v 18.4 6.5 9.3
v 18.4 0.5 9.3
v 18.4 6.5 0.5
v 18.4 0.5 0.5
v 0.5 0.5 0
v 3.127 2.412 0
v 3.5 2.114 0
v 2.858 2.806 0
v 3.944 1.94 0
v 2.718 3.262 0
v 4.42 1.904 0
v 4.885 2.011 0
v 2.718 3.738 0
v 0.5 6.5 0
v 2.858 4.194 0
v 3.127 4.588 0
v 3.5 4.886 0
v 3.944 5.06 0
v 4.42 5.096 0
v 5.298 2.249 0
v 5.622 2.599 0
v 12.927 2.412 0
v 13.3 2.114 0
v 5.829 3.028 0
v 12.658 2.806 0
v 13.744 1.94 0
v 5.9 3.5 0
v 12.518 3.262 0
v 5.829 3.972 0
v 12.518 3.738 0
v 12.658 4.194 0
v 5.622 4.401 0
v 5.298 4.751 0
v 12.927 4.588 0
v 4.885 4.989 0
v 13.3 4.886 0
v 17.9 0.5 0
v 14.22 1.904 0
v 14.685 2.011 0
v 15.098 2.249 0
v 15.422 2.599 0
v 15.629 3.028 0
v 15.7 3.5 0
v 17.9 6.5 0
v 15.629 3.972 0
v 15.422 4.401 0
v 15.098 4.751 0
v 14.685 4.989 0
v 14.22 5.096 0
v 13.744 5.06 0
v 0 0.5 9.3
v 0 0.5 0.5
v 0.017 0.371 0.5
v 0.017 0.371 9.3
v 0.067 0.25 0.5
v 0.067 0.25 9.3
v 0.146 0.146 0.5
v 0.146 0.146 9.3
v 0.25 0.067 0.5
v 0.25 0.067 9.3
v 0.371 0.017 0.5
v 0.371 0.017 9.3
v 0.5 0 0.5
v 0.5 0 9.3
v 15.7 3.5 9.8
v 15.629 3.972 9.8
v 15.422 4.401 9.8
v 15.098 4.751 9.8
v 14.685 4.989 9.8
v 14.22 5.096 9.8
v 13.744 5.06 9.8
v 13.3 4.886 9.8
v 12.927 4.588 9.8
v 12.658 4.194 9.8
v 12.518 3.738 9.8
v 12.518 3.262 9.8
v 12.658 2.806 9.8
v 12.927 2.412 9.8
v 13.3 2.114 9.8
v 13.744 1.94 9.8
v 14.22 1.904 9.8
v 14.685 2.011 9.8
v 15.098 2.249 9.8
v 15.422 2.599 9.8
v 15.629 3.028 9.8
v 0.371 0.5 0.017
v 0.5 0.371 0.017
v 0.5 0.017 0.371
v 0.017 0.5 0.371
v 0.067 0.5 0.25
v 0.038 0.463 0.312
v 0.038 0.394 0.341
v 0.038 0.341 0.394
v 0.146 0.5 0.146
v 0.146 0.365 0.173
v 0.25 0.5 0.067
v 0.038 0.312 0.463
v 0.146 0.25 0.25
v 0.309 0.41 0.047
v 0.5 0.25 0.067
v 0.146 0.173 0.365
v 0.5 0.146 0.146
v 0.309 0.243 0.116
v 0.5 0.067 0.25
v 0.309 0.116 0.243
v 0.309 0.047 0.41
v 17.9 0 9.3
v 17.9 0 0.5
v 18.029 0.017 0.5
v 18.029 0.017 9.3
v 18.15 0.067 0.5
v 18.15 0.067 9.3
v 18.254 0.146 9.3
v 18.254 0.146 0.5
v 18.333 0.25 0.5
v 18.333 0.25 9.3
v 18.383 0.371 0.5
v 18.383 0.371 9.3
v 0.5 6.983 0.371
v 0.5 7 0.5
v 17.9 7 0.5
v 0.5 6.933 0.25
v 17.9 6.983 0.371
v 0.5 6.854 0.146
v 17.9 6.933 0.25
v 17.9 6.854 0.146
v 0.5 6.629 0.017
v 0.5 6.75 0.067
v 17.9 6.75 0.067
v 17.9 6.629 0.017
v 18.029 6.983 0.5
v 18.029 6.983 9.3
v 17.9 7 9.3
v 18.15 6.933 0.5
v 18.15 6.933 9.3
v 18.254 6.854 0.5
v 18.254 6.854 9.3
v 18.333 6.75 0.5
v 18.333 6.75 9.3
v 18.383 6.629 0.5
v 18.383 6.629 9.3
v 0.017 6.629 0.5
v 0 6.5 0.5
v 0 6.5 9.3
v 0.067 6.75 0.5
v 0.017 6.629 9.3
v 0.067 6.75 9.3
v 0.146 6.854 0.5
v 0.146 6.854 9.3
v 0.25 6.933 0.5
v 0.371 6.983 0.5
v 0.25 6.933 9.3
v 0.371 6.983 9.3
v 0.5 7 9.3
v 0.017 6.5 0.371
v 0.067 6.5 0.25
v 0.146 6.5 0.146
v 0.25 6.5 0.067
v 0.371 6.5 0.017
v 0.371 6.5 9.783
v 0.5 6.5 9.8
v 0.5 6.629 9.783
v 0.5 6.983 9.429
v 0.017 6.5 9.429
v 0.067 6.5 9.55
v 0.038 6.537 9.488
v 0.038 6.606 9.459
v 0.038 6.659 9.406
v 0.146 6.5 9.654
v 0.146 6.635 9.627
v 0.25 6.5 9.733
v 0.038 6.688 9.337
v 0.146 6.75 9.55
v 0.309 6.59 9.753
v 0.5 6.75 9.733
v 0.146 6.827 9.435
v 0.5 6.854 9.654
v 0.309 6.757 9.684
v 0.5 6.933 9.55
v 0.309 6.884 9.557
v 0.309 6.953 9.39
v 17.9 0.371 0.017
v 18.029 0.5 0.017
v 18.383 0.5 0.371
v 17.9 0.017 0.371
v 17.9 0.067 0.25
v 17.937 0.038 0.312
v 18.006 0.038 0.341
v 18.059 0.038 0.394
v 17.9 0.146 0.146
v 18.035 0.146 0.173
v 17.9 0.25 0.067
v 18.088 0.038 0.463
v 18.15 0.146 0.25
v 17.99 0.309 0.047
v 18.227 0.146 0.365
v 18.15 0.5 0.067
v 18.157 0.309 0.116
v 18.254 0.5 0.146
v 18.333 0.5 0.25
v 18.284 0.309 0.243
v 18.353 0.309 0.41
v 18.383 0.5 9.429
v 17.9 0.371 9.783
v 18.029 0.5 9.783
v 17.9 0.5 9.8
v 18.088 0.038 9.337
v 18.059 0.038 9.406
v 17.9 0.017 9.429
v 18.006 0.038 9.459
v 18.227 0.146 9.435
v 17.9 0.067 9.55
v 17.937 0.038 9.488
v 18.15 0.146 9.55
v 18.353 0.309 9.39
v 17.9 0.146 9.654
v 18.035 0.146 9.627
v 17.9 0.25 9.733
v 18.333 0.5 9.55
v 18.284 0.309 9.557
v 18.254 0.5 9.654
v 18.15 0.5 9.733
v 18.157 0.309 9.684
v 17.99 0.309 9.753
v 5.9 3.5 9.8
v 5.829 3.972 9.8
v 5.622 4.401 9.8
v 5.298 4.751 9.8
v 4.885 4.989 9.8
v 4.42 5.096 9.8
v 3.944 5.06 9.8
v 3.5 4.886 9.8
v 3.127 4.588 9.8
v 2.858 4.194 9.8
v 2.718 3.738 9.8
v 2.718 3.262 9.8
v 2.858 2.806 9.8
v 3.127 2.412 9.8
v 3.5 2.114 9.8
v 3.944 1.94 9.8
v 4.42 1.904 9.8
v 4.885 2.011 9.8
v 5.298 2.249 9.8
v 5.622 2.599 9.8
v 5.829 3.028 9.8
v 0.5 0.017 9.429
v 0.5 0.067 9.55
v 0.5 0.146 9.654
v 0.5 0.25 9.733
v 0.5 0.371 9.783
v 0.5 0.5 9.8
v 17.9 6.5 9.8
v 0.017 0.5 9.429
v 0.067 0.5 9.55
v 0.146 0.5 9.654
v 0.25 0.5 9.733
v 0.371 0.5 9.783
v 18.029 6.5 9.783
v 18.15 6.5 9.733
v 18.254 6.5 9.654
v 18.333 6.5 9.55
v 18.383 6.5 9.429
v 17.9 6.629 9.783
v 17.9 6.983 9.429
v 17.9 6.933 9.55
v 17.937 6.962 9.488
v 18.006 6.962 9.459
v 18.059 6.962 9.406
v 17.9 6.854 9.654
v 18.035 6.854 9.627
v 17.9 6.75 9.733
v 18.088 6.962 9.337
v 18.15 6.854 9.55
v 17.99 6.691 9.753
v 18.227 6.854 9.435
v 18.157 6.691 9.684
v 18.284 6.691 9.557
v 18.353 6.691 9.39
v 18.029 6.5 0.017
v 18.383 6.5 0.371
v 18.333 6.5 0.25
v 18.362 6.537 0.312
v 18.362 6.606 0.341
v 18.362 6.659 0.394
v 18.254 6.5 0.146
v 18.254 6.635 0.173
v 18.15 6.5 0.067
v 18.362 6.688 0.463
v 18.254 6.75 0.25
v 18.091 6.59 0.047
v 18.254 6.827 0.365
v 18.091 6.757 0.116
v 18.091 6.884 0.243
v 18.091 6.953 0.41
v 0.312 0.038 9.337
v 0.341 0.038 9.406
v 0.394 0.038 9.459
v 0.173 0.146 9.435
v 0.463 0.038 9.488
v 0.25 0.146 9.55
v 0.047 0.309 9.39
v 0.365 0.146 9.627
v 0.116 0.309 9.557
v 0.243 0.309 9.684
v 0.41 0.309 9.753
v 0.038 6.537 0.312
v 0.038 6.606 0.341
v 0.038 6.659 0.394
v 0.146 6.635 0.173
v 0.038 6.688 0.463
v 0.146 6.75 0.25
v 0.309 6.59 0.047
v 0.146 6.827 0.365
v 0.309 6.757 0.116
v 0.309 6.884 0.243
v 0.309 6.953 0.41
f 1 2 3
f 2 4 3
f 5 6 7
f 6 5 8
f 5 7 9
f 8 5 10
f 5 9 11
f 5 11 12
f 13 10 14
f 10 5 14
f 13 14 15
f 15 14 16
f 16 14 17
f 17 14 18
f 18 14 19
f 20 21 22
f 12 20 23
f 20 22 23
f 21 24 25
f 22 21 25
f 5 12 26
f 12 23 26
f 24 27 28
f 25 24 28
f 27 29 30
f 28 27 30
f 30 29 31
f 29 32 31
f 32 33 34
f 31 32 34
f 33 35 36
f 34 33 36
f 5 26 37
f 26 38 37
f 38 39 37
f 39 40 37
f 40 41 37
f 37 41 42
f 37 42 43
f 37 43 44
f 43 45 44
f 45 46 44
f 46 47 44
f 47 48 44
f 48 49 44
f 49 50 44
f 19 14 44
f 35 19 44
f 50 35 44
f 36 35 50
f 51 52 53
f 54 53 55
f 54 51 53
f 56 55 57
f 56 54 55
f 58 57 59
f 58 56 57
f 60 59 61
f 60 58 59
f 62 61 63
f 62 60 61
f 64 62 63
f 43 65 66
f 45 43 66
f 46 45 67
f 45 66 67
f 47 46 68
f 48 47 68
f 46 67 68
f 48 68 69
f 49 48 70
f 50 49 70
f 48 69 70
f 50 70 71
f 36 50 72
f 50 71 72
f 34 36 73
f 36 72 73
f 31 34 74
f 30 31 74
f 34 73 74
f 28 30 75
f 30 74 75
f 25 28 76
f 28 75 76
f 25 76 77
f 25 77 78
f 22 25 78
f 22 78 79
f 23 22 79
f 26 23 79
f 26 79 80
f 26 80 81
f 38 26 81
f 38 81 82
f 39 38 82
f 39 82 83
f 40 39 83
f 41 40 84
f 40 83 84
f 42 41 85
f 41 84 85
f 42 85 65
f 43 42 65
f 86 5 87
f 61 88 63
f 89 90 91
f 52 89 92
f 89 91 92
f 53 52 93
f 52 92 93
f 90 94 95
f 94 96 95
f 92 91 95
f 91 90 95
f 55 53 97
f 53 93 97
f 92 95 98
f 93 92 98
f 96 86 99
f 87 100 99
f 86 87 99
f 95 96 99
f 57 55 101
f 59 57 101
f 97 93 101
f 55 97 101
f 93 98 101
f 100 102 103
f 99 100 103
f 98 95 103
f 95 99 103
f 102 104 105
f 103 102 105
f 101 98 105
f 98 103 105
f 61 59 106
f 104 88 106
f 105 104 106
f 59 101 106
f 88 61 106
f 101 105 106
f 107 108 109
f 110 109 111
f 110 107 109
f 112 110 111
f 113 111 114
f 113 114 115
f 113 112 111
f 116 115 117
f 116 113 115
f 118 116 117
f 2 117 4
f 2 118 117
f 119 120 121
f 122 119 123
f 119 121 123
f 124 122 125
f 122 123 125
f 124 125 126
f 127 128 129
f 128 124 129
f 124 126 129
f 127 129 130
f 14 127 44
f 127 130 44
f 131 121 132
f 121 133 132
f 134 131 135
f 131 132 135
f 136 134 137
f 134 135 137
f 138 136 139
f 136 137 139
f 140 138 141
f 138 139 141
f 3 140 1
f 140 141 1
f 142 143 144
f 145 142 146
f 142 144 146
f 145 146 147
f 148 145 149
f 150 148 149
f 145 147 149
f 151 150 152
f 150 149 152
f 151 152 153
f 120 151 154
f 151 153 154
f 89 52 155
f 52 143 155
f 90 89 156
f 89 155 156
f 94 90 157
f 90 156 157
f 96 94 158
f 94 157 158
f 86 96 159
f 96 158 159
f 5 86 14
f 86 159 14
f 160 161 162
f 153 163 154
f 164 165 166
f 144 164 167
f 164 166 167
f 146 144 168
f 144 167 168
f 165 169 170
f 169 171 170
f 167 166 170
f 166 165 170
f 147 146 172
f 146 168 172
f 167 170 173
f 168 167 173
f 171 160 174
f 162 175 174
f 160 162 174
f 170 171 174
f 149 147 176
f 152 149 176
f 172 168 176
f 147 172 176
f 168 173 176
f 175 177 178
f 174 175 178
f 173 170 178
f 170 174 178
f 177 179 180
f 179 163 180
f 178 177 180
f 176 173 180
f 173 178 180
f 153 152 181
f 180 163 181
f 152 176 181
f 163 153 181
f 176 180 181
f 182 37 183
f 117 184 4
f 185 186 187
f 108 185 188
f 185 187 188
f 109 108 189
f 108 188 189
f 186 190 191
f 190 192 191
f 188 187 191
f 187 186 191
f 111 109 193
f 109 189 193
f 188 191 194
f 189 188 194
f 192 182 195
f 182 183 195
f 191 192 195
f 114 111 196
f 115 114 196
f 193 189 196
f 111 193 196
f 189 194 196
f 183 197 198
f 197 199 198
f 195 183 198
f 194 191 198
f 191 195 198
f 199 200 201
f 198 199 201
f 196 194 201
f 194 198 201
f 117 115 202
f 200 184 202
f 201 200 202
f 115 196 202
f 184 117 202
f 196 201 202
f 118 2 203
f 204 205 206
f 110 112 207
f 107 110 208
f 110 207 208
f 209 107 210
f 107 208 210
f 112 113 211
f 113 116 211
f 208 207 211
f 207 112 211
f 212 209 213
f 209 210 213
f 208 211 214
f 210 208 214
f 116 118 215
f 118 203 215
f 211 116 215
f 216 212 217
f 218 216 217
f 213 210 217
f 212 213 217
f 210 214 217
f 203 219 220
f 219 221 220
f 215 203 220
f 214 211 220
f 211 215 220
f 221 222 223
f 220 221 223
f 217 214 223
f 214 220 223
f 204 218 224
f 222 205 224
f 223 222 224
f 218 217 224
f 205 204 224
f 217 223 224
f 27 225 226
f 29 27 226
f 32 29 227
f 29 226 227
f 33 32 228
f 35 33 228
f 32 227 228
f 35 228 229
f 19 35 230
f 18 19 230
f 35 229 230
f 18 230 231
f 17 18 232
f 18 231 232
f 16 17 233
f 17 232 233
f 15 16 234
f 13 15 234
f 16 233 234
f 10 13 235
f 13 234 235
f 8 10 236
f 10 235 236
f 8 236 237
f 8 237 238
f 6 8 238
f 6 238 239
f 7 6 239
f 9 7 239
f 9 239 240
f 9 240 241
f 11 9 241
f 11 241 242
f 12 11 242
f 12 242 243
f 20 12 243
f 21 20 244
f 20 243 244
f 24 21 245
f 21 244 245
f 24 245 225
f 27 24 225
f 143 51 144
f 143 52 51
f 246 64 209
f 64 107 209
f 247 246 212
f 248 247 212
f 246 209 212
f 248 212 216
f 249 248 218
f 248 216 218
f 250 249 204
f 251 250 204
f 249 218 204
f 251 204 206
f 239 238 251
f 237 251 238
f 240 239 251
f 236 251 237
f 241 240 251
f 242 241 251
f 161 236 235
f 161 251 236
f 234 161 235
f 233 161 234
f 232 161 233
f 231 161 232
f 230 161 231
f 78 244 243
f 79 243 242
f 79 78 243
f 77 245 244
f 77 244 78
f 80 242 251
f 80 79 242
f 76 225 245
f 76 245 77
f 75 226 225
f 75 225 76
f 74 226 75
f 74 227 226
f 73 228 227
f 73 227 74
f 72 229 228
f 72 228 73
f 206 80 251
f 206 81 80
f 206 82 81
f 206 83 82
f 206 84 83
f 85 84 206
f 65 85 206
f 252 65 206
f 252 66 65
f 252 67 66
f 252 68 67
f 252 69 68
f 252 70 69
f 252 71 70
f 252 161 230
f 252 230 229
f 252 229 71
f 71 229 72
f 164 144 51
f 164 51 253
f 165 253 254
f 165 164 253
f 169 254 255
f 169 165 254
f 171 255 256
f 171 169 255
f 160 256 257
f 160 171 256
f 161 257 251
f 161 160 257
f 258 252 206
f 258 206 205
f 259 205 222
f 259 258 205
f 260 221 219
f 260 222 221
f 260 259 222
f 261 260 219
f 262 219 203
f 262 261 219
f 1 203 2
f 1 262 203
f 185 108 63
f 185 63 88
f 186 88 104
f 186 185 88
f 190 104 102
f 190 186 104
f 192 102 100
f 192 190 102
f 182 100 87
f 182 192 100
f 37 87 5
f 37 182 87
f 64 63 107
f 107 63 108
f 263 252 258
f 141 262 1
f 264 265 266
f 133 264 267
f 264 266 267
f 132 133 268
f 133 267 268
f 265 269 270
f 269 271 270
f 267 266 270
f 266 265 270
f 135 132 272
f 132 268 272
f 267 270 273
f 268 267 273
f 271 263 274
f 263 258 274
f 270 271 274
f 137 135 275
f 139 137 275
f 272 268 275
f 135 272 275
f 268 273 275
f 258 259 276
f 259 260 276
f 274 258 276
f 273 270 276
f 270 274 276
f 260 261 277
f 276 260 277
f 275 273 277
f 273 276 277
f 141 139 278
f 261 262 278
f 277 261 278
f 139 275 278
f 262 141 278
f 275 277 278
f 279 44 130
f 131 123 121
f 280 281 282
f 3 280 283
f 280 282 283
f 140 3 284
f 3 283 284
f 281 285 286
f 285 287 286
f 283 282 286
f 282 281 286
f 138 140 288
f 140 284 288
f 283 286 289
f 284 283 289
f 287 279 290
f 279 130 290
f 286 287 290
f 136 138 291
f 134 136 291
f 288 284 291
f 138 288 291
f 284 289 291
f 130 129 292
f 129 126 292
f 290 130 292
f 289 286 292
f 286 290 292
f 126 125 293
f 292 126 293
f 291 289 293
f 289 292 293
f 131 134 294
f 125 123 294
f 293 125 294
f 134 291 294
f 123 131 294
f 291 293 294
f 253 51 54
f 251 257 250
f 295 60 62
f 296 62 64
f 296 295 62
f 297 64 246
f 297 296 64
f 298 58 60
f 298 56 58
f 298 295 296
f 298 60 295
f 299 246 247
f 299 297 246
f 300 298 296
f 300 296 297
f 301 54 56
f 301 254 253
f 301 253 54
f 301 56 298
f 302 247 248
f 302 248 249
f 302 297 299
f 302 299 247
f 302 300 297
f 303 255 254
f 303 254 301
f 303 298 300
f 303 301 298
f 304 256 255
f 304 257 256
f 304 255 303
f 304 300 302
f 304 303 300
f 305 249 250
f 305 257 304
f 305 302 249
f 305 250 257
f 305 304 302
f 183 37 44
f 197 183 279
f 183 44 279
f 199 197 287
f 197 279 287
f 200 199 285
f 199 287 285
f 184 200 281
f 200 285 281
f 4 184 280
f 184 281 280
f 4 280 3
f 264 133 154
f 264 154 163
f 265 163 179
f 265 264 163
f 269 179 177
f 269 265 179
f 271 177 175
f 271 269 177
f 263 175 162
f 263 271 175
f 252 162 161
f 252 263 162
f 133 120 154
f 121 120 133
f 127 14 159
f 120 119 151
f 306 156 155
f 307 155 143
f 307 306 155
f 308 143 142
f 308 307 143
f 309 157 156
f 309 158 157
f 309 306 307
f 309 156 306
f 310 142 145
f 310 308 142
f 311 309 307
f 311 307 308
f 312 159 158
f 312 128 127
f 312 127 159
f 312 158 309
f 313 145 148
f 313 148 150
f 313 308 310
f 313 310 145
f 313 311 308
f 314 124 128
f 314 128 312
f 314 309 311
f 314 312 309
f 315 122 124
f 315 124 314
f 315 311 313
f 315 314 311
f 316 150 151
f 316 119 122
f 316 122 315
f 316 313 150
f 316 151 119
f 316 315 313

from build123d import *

# Parameters (mm, degrees)
SKETCH_1_W          = 18.4
SKETCH_1_H          = 7
EXTRUDE_1_DEPTH     = 9.8
SKETCH_2_R          = 1.6
CUT_EXTRUDE_1_DEPTH = 9.8
FILLET_1_R          = 0.5


with BuildPart() as part:
    # 草图1 → 凸台-拉伸1 (new body)
    with BuildSketch(Plane.XY):
        with Locations((9.2, 3.5)):
            Rectangle(SKETCH_1_W, SKETCH_1_H)
    extrude(amount=EXTRUDE_1_DEPTH)

    # 草图2 → 切除-拉伸1 (cut)
    with BuildSketch(Plane.XY.offset(9.8)):
        with Locations((4.3, 3.5)):
            Circle(SKETCH_2_R)
        with Locations((14.1, 3.5)):
            Circle(SKETCH_2_R)
    extrude(amount=-CUT_EXTRUDE_1_DEPTH, mode=Mode.SUBTRACT)

    # 圆角1
    fillet_1_edges = [part.edges().sort_by_distance(p)[0] for p in [
        (18.4, 3.5, 9.8),
        (9.2, 7, 9.8),
        (0, 3.5, 9.8),
        (9.2, 7, 0),
        (18.4, 3.5, 0),
        (9.2, 0, 0),
        (0, 3.5, 0),
        (0, 7, 4.9),
        (18.4, 7, 4.9),
        (18.4, 0, 4.9),
        (0, 0, 4.9),
        (9.2, 0, 9.8),
    ]]
    fillet(fillet_1_edges, radius=FILLET_1_R)


solid = part.part
